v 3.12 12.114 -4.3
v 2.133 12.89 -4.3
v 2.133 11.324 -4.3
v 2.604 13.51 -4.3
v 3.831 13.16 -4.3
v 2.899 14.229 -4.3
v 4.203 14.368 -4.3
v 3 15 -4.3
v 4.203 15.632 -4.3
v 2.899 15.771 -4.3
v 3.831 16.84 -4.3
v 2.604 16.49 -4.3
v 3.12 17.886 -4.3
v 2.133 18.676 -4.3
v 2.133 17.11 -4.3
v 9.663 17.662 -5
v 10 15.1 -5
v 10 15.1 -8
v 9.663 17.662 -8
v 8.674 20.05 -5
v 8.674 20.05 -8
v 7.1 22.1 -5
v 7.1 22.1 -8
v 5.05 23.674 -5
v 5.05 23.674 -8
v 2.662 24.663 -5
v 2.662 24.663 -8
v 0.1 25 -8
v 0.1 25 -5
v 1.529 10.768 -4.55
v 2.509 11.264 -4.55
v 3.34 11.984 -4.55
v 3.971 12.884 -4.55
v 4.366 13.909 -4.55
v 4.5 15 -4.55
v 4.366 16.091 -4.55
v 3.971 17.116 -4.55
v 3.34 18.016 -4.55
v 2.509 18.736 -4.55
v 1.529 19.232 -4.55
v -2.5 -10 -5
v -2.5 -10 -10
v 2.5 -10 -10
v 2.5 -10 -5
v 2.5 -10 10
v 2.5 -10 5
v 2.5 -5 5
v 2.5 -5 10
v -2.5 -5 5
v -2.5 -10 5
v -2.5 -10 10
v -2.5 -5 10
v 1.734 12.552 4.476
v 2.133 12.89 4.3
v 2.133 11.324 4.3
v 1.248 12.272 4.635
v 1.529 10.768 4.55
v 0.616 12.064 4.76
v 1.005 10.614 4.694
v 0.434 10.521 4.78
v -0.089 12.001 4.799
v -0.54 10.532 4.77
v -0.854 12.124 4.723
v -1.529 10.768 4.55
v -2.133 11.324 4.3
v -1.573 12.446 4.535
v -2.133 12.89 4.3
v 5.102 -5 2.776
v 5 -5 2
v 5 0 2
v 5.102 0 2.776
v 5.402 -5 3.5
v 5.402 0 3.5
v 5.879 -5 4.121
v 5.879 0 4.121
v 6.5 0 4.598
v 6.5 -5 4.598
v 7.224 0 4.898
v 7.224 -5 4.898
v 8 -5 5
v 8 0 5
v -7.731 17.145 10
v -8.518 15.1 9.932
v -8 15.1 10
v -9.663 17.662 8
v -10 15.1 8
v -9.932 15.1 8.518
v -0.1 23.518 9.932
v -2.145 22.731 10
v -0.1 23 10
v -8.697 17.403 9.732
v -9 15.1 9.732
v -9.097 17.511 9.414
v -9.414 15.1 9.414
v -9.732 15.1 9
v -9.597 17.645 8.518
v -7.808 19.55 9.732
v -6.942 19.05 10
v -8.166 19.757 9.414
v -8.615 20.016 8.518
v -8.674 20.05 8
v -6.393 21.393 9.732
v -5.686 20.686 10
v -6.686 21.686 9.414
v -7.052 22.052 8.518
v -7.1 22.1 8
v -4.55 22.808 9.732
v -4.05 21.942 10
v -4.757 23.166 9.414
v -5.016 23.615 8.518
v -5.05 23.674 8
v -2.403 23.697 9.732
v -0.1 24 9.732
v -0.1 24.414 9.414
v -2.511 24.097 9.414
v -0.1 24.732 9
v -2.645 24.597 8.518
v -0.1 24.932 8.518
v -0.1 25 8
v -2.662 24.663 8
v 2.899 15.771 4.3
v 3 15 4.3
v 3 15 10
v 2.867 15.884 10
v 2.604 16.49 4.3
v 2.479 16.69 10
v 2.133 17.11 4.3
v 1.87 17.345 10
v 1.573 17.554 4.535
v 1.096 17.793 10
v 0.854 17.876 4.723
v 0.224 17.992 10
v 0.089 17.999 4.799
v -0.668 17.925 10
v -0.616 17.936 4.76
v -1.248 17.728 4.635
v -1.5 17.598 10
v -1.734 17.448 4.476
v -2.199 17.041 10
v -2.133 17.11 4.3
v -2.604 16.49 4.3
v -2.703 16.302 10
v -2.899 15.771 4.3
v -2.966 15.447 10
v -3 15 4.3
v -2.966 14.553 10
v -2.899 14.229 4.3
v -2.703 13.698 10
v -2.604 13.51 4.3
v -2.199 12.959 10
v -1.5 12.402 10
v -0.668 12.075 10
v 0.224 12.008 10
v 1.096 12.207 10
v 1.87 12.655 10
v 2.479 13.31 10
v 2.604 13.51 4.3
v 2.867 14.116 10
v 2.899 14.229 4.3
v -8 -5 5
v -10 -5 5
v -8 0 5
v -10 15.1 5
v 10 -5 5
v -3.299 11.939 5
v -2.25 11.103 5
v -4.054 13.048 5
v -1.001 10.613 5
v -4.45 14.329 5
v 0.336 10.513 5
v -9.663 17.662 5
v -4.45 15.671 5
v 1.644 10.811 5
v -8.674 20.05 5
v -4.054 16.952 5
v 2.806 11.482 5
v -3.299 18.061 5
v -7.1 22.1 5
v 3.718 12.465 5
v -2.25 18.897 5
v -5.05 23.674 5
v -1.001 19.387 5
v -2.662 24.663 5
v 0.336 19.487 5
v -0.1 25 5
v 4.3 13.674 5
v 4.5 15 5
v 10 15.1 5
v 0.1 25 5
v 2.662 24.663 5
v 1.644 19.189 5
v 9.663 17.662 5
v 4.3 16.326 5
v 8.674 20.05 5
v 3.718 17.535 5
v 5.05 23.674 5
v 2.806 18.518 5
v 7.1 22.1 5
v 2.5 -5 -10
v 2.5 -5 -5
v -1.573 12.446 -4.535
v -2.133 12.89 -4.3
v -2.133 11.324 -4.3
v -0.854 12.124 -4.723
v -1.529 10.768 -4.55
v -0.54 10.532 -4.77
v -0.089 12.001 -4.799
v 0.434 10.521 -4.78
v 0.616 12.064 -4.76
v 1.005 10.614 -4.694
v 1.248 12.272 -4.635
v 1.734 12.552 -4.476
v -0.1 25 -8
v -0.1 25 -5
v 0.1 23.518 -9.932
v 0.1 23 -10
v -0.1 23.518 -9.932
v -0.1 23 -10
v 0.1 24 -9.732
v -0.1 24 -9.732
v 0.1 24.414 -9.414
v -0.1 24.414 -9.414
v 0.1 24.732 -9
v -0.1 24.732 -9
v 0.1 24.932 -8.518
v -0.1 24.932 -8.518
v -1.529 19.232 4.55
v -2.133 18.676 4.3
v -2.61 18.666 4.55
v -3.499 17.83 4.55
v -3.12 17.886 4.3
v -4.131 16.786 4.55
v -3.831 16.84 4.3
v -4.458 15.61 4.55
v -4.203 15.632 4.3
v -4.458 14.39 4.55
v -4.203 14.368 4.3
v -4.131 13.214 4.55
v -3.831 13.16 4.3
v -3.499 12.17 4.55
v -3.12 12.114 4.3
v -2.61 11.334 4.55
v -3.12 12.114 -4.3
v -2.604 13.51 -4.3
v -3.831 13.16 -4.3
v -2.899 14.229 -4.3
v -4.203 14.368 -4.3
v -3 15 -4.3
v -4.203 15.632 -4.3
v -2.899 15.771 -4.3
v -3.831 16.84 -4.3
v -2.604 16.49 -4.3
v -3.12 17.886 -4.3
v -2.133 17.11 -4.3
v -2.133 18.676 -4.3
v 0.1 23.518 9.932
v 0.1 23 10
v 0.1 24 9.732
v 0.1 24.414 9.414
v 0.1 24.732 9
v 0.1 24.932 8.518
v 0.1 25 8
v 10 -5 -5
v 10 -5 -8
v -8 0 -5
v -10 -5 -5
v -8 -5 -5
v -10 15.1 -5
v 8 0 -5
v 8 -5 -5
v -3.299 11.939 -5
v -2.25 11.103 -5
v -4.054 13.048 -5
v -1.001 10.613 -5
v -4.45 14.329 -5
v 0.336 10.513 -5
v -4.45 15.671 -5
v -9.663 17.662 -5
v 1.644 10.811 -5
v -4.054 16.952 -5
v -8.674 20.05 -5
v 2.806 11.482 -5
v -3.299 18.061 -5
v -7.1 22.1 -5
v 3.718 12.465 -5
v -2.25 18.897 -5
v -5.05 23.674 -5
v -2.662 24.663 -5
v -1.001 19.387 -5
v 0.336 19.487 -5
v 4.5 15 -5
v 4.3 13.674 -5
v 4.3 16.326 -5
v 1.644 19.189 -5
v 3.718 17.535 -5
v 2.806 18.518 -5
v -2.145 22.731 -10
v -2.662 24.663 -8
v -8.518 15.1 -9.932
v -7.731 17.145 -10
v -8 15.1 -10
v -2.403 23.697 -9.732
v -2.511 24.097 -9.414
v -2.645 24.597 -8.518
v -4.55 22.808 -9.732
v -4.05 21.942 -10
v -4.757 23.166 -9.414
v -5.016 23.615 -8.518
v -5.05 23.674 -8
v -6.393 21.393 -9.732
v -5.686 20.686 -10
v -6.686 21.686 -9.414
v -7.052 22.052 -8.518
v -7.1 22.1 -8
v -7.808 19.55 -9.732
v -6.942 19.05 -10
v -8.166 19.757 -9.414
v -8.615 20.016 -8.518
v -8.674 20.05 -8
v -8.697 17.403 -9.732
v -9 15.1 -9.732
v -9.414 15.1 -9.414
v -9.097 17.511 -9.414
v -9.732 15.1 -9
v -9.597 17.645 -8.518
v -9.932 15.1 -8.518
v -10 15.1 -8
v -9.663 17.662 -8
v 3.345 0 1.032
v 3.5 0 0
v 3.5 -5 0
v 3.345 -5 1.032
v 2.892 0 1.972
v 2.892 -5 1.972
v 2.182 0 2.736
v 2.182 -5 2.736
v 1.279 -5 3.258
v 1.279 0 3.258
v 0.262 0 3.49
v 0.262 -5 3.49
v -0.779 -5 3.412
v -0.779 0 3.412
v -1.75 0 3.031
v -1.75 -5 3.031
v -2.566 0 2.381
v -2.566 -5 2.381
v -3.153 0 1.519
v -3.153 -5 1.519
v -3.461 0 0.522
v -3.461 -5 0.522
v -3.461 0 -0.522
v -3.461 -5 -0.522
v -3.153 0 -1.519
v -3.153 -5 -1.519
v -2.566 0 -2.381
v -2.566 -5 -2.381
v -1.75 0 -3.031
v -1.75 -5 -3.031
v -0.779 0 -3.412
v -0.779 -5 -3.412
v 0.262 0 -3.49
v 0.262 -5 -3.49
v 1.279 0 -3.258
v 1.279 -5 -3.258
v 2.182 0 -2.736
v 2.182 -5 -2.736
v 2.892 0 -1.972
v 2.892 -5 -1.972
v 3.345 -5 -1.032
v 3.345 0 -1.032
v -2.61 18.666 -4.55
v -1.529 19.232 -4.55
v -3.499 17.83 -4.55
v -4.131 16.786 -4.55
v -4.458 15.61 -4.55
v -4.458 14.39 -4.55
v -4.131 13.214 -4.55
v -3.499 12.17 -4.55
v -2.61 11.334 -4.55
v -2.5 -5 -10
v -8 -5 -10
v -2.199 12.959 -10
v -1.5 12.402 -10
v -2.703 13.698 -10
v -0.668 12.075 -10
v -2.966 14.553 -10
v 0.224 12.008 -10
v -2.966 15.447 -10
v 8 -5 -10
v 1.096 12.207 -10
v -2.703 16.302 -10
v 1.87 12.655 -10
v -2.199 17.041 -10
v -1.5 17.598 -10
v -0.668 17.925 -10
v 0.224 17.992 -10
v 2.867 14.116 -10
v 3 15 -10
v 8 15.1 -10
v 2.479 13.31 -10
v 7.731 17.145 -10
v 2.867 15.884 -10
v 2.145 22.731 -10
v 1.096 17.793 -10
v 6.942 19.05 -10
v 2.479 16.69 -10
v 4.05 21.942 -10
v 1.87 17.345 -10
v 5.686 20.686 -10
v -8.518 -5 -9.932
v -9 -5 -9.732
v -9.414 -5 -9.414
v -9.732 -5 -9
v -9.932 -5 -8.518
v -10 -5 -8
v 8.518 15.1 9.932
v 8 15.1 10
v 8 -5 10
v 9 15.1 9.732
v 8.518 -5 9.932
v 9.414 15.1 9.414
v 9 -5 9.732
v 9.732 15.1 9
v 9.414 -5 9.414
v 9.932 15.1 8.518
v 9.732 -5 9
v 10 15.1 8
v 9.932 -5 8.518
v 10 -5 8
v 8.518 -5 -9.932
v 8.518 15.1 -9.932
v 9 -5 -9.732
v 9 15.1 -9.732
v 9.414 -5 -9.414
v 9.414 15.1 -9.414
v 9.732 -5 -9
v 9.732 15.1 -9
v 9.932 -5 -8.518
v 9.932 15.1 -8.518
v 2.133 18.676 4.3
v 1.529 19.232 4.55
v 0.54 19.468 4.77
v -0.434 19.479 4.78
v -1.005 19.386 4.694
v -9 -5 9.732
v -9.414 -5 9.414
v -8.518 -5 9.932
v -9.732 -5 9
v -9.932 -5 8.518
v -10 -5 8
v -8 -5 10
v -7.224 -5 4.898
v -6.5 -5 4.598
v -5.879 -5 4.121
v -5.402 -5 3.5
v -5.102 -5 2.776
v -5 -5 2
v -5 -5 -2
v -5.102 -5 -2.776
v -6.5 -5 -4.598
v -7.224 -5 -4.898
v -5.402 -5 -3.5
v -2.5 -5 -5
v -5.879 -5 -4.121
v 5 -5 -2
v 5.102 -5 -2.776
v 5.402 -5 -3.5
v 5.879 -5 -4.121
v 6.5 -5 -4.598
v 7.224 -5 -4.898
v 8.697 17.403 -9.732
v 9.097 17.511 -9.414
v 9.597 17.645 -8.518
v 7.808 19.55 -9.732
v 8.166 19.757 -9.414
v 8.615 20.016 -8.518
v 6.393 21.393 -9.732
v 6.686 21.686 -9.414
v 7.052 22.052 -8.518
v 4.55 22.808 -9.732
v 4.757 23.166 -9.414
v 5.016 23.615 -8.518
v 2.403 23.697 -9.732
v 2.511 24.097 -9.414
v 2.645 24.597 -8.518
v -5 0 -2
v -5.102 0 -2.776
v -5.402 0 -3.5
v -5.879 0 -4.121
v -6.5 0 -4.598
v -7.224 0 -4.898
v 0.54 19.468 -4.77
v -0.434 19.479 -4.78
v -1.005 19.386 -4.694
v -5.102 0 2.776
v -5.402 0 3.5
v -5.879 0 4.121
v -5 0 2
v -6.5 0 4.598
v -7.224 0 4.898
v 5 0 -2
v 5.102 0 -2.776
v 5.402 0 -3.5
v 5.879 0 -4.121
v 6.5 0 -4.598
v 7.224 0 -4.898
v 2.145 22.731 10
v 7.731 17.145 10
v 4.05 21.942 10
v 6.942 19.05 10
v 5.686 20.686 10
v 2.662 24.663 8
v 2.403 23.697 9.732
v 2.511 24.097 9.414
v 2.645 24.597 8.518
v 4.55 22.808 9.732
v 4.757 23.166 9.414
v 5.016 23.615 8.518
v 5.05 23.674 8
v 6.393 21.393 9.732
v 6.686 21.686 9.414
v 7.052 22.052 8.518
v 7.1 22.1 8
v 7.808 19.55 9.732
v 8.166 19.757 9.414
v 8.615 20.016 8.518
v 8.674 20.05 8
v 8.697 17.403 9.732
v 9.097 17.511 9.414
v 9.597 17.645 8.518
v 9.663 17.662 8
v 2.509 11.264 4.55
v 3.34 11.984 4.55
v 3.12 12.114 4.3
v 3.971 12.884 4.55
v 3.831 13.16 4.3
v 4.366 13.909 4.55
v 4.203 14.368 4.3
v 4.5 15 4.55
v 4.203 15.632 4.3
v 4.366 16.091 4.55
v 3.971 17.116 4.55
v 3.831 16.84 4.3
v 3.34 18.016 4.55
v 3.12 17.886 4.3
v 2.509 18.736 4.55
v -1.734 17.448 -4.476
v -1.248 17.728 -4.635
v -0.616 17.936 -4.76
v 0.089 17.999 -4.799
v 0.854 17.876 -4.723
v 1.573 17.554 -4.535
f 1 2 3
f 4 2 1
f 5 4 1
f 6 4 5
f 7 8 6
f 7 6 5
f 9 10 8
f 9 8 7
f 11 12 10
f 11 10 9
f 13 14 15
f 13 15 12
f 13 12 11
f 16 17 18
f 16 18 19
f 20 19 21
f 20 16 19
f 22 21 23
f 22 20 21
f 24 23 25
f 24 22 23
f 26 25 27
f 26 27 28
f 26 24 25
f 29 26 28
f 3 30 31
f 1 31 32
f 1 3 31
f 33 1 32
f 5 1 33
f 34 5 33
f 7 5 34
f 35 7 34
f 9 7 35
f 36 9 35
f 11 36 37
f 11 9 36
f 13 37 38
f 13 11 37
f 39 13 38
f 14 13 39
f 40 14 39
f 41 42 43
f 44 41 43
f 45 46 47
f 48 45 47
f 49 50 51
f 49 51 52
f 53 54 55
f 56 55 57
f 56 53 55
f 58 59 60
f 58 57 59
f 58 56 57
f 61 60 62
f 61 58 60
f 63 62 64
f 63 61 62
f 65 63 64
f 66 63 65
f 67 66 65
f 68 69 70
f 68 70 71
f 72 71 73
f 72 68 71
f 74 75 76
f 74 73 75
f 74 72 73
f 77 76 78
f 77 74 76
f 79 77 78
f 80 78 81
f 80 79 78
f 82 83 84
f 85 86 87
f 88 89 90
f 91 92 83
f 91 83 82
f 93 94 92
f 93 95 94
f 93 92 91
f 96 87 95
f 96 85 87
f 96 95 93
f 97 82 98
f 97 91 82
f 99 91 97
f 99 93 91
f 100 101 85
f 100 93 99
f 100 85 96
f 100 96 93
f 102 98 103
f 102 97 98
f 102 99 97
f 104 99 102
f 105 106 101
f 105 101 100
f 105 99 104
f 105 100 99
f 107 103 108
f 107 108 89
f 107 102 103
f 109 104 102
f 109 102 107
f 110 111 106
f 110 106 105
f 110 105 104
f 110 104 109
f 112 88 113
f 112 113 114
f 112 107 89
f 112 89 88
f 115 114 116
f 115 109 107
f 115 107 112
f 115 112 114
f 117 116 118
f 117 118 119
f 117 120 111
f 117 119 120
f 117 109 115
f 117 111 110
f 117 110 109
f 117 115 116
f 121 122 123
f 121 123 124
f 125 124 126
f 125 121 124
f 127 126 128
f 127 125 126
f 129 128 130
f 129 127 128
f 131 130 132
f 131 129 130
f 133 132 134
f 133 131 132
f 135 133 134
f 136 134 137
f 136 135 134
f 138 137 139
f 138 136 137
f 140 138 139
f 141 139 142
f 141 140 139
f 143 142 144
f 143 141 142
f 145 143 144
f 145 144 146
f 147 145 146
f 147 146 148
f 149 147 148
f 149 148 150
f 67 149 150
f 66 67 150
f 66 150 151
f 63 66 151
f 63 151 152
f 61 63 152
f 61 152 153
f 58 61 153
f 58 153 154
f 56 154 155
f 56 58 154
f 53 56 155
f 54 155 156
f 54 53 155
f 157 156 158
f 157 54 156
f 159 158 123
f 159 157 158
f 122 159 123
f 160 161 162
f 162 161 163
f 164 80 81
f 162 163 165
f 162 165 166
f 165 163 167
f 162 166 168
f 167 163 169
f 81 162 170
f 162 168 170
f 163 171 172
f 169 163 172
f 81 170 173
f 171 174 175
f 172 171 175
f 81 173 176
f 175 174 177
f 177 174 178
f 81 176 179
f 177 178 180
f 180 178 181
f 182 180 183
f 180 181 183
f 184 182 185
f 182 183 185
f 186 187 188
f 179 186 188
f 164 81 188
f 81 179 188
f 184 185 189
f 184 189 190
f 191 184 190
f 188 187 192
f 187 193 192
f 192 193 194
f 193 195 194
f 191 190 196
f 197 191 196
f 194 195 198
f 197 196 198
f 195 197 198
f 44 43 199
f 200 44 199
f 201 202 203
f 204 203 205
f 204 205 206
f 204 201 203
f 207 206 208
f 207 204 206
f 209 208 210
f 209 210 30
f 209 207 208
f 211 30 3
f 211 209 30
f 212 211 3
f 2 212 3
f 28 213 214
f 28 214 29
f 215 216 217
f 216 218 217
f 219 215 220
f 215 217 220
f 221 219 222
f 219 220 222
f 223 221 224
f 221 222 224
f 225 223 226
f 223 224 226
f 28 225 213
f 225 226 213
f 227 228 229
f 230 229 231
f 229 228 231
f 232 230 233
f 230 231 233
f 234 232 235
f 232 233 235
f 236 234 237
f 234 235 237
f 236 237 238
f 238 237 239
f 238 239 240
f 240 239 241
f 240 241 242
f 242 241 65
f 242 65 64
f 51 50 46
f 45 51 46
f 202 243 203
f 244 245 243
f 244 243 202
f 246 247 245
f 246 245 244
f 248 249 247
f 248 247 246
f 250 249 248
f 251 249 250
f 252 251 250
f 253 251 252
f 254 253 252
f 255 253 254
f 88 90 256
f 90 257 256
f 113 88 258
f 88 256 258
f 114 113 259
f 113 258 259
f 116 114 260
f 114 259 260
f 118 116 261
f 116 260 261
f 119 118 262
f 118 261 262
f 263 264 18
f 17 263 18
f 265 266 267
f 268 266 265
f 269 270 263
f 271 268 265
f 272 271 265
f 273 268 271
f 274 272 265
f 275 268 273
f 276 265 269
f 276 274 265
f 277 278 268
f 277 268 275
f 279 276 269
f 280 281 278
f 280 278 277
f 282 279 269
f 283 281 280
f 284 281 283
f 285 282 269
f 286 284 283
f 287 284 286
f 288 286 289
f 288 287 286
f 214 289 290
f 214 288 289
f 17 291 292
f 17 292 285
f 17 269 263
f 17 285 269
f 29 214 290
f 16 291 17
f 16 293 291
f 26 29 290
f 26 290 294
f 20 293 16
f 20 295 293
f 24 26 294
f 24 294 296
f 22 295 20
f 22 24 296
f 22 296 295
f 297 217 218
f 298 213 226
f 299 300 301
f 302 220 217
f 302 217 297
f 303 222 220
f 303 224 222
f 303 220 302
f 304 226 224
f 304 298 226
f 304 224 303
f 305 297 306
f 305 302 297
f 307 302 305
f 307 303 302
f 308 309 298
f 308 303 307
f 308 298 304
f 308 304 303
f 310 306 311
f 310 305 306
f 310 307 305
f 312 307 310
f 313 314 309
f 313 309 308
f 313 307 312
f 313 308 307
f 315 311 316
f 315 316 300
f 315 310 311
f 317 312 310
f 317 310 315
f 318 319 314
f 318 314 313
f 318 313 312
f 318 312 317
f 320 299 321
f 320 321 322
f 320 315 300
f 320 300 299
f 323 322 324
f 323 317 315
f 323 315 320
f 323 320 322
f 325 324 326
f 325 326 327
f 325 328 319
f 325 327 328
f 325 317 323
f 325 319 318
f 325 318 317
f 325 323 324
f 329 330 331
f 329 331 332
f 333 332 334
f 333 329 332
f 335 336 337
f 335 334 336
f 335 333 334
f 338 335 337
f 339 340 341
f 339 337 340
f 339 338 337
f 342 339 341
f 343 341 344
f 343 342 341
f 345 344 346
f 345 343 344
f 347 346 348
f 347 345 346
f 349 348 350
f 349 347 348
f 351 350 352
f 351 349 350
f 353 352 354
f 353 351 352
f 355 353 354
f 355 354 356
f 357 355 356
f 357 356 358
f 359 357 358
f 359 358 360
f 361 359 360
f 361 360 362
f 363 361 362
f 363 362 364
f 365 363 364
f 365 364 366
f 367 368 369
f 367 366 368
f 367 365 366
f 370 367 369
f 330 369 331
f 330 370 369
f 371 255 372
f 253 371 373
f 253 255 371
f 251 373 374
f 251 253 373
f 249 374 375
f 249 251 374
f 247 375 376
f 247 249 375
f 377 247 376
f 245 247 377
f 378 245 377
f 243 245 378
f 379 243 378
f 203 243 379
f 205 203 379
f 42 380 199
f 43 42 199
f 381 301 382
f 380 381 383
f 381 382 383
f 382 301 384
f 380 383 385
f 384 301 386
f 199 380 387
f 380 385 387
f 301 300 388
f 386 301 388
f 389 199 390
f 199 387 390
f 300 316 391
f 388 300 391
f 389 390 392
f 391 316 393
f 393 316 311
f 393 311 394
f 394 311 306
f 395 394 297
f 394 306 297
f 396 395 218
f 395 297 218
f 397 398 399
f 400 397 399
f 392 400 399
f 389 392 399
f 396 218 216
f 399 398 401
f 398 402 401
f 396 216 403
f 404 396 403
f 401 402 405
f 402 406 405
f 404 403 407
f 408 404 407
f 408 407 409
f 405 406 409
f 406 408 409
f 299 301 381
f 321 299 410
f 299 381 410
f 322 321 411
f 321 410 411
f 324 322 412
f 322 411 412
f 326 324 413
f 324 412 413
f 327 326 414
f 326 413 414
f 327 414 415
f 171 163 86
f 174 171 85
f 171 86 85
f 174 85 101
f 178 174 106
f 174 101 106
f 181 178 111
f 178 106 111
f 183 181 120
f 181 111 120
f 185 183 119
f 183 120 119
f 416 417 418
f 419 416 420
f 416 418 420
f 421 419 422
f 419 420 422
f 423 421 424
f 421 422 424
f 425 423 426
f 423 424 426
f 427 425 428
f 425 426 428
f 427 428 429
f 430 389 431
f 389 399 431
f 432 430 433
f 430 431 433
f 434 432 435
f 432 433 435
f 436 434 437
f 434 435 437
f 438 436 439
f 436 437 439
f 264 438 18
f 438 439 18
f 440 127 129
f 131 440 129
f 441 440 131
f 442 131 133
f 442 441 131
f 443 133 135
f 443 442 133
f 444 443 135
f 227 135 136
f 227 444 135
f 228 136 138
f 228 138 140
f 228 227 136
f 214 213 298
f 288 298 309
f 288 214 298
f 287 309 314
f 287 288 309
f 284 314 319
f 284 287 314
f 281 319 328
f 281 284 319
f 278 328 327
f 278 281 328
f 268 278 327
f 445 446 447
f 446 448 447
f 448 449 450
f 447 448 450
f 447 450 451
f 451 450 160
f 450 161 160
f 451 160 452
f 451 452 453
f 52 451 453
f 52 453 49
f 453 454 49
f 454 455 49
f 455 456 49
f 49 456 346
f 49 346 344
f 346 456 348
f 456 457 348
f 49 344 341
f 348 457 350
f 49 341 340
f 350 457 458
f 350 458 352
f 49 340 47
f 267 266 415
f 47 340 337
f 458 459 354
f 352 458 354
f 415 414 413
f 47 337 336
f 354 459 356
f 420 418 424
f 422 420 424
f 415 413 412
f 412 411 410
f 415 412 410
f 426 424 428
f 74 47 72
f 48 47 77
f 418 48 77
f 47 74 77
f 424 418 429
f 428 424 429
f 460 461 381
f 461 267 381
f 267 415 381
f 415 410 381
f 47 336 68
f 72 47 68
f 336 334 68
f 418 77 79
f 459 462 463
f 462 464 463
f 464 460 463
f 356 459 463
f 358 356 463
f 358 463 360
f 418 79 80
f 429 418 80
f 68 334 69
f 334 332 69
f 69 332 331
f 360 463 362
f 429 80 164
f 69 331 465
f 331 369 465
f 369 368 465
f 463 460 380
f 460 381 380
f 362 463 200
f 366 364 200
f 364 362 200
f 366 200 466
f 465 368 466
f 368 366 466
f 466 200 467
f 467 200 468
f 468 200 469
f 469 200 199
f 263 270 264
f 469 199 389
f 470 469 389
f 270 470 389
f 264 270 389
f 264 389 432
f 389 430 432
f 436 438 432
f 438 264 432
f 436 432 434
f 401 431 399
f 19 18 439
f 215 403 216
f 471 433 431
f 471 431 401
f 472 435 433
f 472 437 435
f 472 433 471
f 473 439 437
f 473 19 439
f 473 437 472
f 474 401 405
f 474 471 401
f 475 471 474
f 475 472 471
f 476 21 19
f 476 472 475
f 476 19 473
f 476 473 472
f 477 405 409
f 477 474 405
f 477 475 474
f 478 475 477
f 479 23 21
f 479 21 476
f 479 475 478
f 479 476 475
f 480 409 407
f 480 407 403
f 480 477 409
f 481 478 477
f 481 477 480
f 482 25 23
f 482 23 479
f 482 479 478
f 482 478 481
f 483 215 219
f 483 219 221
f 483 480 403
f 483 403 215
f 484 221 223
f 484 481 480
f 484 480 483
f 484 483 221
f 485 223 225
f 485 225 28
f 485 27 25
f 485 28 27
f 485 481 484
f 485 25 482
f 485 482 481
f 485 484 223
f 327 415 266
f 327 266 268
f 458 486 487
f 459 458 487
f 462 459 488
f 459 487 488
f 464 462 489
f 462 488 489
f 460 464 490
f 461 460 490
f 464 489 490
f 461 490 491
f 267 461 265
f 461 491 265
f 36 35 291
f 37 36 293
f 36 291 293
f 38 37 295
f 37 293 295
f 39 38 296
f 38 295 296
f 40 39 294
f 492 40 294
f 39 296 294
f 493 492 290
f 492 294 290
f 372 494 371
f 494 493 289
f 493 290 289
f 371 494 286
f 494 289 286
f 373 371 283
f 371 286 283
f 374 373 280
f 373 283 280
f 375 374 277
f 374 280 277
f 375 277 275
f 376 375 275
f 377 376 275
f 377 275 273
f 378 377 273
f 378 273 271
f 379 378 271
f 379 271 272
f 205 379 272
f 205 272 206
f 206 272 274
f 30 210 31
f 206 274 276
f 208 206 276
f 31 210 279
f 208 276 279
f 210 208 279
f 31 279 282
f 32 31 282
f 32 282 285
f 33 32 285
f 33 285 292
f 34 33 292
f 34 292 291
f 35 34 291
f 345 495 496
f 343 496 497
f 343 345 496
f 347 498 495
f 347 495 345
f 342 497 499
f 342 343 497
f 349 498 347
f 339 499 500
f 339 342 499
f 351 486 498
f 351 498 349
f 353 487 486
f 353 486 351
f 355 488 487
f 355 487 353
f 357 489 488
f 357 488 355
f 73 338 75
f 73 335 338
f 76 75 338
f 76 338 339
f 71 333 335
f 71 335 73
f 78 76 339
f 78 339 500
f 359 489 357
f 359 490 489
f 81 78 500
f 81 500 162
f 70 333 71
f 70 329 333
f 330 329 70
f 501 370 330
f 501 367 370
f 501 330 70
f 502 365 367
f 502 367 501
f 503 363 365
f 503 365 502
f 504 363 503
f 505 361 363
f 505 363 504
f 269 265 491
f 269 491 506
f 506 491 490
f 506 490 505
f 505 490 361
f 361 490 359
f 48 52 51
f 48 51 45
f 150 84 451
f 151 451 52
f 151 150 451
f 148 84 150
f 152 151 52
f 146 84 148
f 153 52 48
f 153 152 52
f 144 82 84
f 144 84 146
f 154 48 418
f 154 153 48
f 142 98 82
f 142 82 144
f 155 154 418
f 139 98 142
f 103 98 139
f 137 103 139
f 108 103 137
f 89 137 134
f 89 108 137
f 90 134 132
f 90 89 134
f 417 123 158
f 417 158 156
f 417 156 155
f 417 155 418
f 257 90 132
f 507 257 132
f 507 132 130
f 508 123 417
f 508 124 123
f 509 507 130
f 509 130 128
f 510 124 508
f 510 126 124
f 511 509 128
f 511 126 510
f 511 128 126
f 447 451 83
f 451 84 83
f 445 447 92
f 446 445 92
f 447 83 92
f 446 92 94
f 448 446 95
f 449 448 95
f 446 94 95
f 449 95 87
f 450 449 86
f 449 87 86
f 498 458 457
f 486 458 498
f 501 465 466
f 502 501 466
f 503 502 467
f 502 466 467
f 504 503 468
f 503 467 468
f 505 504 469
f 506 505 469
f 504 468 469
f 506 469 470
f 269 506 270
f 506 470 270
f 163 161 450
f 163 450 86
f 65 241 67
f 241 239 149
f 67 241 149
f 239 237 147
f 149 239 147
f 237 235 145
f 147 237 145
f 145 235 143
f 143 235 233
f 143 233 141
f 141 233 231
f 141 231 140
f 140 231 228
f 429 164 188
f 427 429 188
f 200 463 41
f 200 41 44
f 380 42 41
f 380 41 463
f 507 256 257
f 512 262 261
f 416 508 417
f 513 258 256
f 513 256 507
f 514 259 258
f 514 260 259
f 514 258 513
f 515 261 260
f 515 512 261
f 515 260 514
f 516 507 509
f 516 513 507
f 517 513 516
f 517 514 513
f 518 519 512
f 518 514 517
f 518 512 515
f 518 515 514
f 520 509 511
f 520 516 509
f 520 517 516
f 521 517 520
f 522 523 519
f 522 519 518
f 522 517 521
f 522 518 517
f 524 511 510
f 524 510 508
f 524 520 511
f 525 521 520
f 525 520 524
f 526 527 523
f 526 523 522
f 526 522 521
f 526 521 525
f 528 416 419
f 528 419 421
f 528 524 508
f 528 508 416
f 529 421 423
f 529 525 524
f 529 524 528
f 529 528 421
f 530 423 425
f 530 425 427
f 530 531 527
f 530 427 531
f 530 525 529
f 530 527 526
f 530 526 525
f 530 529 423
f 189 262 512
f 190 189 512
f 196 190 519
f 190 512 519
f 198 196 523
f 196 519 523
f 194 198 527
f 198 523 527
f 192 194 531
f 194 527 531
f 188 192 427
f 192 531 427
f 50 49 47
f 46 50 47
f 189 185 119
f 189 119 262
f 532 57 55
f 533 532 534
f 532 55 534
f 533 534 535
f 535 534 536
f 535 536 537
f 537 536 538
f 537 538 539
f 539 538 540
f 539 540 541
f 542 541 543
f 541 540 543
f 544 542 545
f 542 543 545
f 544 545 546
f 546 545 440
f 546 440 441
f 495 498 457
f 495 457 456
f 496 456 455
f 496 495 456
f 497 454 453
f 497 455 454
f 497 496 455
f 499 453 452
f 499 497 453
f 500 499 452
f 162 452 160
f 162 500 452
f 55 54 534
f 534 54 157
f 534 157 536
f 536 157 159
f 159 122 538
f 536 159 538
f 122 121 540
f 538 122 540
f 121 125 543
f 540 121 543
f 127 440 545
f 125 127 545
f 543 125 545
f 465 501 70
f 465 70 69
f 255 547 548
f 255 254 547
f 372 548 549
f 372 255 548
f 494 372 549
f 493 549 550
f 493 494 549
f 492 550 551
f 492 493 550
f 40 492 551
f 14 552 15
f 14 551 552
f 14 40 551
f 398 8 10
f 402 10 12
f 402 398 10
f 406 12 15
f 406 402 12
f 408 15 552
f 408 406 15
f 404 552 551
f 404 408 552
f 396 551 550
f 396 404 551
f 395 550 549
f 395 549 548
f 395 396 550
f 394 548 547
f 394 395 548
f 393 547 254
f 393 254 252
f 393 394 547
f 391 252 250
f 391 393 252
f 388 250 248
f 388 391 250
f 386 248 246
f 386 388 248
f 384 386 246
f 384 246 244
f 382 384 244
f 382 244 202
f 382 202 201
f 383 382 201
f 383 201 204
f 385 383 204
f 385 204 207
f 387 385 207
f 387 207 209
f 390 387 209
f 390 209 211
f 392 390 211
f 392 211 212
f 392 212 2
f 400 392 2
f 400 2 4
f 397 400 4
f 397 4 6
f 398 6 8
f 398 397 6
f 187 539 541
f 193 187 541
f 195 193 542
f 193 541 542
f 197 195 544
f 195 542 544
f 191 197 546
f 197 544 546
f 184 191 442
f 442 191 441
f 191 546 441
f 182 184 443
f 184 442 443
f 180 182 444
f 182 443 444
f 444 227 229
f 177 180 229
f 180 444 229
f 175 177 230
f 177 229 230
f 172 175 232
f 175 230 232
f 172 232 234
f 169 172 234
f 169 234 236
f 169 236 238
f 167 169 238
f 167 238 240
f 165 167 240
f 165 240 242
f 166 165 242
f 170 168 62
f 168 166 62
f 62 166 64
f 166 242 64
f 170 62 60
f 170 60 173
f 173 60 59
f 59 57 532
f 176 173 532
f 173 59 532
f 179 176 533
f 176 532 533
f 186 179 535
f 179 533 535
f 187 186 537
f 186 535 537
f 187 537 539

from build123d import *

# Parameters (mm, degrees)
CYLINDER007_R         = 4.8
CYLINDER007_DEPTH     = 15
BOX007_W              = 11
BOX007_H              = 7
BOX007_DEPTH          = 10
FILLET_R              = 3
ARRAY_COUNT           = 2
ARRAY_ANGLE           = 180
ARRAY_PLACEMENT_ANGLE = 90
CYLINDER004_R         = 3
CYLINDER004_DEPTH     = 30
CYLINDER_R            = 3.5
CYLINDER_DEPTH        = 15
CYLINDER006_R         = 4.5
CYLINDER006_DEPTH     = 4
CYLINDER005_R         = 4.5
CYLINDER005_DEPTH     = 4
BOX001_W              = 5
BOX001_H              = 10
BOX001_DEPTH          = 5
BOX002_W              = 20
BOX002_H              = 25
BOX002_DEPTH          = 5
BOX_W                 = 20
BOX_H                 = 5
BOX_DEPTH             = 20
CHAMFER_SIZE          = 0.25
CHAMFER001_SIZE       = 0.25
CHAMFER002_SIZE       = 0.25
FILLET001_R           = 9.9
FILLET002_R           = 2


with BuildPart() as cilindro005:
    # Cylinder007 → Cylinder007 (new body)
    with BuildSketch(Plane.XZ.offset(-23)):
        Circle(CYLINDER007_R)
    extrude(amount=CYLINDER007_DEPTH)


with BuildPart() as array:
    # Box007 → Box007 (new body)
    with BuildSketch(Plane(origin=(10, 5, -5), x_dir=(1, 0, 0), z_dir=(0, 0, 1))):
        with Locations((5.5, 3.5)):
            Rectangle(BOX007_W, BOX007_H)
    extrude(amount=BOX007_DEPTH)


with BuildPart() as array_1:
    # BaseFeature placement: moved
    add(array.part.moved(Location((-10, -5, 5))))

    # Fillet
    fillet_edges = [array_1.edges().sort_by_distance(p)[0] for p in [
        (5.5, 0, 10),
        (5.5, 0, 0),
    ]]
    fillet(fillet_edges, radius=FILLET_R)


with BuildPart() as array_2:
    # Body placement: moved
    add(array_1.part.moved(Location((-5, 5, 0))))

    # Array: Array ×2 about axis
    array_axis = Axis((0, 0, 0), (0, 0, 1))


with BuildPart() as array_3:
    add(array_2.part)
    for i in range(1, ARRAY_COUNT):
        add(array_2.part.rotate(array_axis, i * ARRAY_ANGLE / (ARRAY_COUNT - 1)))


with BuildPart() as array_4:
    # Array placement: moved
    add(array_3.part.moved(Location((0, -3, -5))).rotate(Axis((0, -3, -5), (0, 0, 1)), ARRAY_PLACEMENT_ANGLE))


with BuildPart() as cilindro004:
    # Cylinder004 → Cylinder004 (new body)
    with BuildSketch(Plane(origin=(0, 15, -15), x_dir=(1, 0, 0), z_dir=(0, 0, 1))):
        Circle(CYLINDER004_R)
    extrude(amount=CYLINDER004_DEPTH)


with BuildPart() as cilindro:
    # Cylinder → Cylinder (new body)
    with BuildSketch(Plane.XZ.offset(-5)):
        Circle(CYLINDER_R)
    extrude(amount=CYLINDER_DEPTH)


with BuildPart() as apoyo1:
    # Cylinder006 → Cylinder006 (new body)
    with BuildSketch(Plane.XY.offset(4.3)):
        Circle(CYLINDER006_R)
    extrude(amount=CYLINDER006_DEPTH)


with BuildPart() as fusion003:
    # Cylinder005 → Cylinder005 (new body)
    with BuildSketch(Plane.XY.offset(-8.3)):
        Circle(CYLINDER005_R)
    extrude(amount=CYLINDER005_DEPTH)

    # Fusion003: union apoyo1
    add(apoyo1.part)


with BuildPart() as fusion003_1:
    # Fusion003 placement: moved
    add(fusion003.part.moved(Location((0, 15, 0))))


with BuildPart() as pin0:
    # Box001 → Box001 (new body)
    with BuildSketch(Plane(origin=(-2.5, -10, 5), x_dir=(1, 0, 0), z_dir=(0, 0, 1))):
        with Locations((2.5, 5)):
            Rectangle(BOX001_W, BOX001_H)
    extrude(amount=BOX001_DEPTH)


with BuildPart() as pin001:
    # Clone base: copy of pin0
    add(pin0.part)


with BuildPart() as pin001_1:
    # Clone placement: moved
    add(pin001.part.moved(Location((0, 0, -15))))


with BuildPart() as pared1:
    # Box002 → Box002 (new body)
    with BuildSketch(Plane(origin=(-10, 0, 5), x_dir=(1, 0, 0), z_dir=(0, 0, 1))):
        with Locations((10, 12.5)):
            Rectangle(BOX002_W, BOX002_H)
    extrude(amount=BOX002_DEPTH)


with BuildPart() as pared002:
    # Clone001 base: copy of pared1
    add(pared1.part)


with BuildPart() as pared002_1:
    # Clone001 placement: moved
    add(pared002.part.moved(Location((0, 0, -15))))


with BuildPart() as fillet002:
    # Box → Box (new body)
    with BuildSketch(Plane(origin=(-10, -5, -10), x_dir=(1, 0, 0), z_dir=(0, 0, 1))):
        with Locations((10, 2.5)):
            Rectangle(BOX_W, BOX_H)
    extrude(amount=BOX_DEPTH)

    # Fusion: union pin0, pin001, pared1, pared002
    add(pin0.part)
    add(pin001_1.part)
    add(pared1.part)
    add(pared002_1.part)

    # Fusion004: union Fusion003
    add(fusion003_1.part)

    # Cut001: cut Cilindro
    add(cilindro.part, mode=Mode.SUBTRACT)

    # Cut002: cut Cilindro004
    add(cilindro004.part, mode=Mode.SUBTRACT)

    # Cut003: cut Array
    add(array_4.part, mode=Mode.SUBTRACT)

    # Cut004: cut Cilindro005
    add(cilindro005.part, mode=Mode.SUBTRACT)

    # Chamfer
    chamfer_edges = [fillet002.edges().sort_by_distance(p)[0] for p in [
        (3.863213, 17.307723, 4.3),
        (3.863213, 12.692277, 4.3),
    ]]
    chamfer(chamfer_edges, length=CHAMFER_SIZE)

    # Chamfer001
    chamfer001_edges = [fillet002.edges().sort_by_distance(p)[0] for p in [
        (-4.5, 15, 4.3),
    ]]
    chamfer(chamfer001_edges, length=CHAMFER001_SIZE)

    # Chamfer002
    chamfer002_edges = [fillet002.edges().sort_by_distance(p)[0] for p in [
        (3.863213, 17.307723, -4.3),
        (-4.5, 15, -4.3),
        (3.863213, 12.692277, -4.3),
    ]]
    chamfer(chamfer002_edges, length=CHAMFER002_SIZE)

    # Fillet001
    fillet001_edges = [fillet002.edges().sort_by_distance(p)[0] for p in [
        (-10, 25, -7.5),
        (10, 25, -7.5),
        (-10, 25, 7.5),
        (10, 25, 7.5),
    ]]
    fillet(fillet001_edges, radius=FILLET001_R)

    # Fillet002
    fillet002_edges = [fillet002.edges().sort_by_distance(p)[0] for p in [
        (-10, 5.05, -10),
        (-10, 5.05, 10),
    ]]
    fillet(fillet002_edges, radius=FILLET002_R)


solid = fillet002.part
